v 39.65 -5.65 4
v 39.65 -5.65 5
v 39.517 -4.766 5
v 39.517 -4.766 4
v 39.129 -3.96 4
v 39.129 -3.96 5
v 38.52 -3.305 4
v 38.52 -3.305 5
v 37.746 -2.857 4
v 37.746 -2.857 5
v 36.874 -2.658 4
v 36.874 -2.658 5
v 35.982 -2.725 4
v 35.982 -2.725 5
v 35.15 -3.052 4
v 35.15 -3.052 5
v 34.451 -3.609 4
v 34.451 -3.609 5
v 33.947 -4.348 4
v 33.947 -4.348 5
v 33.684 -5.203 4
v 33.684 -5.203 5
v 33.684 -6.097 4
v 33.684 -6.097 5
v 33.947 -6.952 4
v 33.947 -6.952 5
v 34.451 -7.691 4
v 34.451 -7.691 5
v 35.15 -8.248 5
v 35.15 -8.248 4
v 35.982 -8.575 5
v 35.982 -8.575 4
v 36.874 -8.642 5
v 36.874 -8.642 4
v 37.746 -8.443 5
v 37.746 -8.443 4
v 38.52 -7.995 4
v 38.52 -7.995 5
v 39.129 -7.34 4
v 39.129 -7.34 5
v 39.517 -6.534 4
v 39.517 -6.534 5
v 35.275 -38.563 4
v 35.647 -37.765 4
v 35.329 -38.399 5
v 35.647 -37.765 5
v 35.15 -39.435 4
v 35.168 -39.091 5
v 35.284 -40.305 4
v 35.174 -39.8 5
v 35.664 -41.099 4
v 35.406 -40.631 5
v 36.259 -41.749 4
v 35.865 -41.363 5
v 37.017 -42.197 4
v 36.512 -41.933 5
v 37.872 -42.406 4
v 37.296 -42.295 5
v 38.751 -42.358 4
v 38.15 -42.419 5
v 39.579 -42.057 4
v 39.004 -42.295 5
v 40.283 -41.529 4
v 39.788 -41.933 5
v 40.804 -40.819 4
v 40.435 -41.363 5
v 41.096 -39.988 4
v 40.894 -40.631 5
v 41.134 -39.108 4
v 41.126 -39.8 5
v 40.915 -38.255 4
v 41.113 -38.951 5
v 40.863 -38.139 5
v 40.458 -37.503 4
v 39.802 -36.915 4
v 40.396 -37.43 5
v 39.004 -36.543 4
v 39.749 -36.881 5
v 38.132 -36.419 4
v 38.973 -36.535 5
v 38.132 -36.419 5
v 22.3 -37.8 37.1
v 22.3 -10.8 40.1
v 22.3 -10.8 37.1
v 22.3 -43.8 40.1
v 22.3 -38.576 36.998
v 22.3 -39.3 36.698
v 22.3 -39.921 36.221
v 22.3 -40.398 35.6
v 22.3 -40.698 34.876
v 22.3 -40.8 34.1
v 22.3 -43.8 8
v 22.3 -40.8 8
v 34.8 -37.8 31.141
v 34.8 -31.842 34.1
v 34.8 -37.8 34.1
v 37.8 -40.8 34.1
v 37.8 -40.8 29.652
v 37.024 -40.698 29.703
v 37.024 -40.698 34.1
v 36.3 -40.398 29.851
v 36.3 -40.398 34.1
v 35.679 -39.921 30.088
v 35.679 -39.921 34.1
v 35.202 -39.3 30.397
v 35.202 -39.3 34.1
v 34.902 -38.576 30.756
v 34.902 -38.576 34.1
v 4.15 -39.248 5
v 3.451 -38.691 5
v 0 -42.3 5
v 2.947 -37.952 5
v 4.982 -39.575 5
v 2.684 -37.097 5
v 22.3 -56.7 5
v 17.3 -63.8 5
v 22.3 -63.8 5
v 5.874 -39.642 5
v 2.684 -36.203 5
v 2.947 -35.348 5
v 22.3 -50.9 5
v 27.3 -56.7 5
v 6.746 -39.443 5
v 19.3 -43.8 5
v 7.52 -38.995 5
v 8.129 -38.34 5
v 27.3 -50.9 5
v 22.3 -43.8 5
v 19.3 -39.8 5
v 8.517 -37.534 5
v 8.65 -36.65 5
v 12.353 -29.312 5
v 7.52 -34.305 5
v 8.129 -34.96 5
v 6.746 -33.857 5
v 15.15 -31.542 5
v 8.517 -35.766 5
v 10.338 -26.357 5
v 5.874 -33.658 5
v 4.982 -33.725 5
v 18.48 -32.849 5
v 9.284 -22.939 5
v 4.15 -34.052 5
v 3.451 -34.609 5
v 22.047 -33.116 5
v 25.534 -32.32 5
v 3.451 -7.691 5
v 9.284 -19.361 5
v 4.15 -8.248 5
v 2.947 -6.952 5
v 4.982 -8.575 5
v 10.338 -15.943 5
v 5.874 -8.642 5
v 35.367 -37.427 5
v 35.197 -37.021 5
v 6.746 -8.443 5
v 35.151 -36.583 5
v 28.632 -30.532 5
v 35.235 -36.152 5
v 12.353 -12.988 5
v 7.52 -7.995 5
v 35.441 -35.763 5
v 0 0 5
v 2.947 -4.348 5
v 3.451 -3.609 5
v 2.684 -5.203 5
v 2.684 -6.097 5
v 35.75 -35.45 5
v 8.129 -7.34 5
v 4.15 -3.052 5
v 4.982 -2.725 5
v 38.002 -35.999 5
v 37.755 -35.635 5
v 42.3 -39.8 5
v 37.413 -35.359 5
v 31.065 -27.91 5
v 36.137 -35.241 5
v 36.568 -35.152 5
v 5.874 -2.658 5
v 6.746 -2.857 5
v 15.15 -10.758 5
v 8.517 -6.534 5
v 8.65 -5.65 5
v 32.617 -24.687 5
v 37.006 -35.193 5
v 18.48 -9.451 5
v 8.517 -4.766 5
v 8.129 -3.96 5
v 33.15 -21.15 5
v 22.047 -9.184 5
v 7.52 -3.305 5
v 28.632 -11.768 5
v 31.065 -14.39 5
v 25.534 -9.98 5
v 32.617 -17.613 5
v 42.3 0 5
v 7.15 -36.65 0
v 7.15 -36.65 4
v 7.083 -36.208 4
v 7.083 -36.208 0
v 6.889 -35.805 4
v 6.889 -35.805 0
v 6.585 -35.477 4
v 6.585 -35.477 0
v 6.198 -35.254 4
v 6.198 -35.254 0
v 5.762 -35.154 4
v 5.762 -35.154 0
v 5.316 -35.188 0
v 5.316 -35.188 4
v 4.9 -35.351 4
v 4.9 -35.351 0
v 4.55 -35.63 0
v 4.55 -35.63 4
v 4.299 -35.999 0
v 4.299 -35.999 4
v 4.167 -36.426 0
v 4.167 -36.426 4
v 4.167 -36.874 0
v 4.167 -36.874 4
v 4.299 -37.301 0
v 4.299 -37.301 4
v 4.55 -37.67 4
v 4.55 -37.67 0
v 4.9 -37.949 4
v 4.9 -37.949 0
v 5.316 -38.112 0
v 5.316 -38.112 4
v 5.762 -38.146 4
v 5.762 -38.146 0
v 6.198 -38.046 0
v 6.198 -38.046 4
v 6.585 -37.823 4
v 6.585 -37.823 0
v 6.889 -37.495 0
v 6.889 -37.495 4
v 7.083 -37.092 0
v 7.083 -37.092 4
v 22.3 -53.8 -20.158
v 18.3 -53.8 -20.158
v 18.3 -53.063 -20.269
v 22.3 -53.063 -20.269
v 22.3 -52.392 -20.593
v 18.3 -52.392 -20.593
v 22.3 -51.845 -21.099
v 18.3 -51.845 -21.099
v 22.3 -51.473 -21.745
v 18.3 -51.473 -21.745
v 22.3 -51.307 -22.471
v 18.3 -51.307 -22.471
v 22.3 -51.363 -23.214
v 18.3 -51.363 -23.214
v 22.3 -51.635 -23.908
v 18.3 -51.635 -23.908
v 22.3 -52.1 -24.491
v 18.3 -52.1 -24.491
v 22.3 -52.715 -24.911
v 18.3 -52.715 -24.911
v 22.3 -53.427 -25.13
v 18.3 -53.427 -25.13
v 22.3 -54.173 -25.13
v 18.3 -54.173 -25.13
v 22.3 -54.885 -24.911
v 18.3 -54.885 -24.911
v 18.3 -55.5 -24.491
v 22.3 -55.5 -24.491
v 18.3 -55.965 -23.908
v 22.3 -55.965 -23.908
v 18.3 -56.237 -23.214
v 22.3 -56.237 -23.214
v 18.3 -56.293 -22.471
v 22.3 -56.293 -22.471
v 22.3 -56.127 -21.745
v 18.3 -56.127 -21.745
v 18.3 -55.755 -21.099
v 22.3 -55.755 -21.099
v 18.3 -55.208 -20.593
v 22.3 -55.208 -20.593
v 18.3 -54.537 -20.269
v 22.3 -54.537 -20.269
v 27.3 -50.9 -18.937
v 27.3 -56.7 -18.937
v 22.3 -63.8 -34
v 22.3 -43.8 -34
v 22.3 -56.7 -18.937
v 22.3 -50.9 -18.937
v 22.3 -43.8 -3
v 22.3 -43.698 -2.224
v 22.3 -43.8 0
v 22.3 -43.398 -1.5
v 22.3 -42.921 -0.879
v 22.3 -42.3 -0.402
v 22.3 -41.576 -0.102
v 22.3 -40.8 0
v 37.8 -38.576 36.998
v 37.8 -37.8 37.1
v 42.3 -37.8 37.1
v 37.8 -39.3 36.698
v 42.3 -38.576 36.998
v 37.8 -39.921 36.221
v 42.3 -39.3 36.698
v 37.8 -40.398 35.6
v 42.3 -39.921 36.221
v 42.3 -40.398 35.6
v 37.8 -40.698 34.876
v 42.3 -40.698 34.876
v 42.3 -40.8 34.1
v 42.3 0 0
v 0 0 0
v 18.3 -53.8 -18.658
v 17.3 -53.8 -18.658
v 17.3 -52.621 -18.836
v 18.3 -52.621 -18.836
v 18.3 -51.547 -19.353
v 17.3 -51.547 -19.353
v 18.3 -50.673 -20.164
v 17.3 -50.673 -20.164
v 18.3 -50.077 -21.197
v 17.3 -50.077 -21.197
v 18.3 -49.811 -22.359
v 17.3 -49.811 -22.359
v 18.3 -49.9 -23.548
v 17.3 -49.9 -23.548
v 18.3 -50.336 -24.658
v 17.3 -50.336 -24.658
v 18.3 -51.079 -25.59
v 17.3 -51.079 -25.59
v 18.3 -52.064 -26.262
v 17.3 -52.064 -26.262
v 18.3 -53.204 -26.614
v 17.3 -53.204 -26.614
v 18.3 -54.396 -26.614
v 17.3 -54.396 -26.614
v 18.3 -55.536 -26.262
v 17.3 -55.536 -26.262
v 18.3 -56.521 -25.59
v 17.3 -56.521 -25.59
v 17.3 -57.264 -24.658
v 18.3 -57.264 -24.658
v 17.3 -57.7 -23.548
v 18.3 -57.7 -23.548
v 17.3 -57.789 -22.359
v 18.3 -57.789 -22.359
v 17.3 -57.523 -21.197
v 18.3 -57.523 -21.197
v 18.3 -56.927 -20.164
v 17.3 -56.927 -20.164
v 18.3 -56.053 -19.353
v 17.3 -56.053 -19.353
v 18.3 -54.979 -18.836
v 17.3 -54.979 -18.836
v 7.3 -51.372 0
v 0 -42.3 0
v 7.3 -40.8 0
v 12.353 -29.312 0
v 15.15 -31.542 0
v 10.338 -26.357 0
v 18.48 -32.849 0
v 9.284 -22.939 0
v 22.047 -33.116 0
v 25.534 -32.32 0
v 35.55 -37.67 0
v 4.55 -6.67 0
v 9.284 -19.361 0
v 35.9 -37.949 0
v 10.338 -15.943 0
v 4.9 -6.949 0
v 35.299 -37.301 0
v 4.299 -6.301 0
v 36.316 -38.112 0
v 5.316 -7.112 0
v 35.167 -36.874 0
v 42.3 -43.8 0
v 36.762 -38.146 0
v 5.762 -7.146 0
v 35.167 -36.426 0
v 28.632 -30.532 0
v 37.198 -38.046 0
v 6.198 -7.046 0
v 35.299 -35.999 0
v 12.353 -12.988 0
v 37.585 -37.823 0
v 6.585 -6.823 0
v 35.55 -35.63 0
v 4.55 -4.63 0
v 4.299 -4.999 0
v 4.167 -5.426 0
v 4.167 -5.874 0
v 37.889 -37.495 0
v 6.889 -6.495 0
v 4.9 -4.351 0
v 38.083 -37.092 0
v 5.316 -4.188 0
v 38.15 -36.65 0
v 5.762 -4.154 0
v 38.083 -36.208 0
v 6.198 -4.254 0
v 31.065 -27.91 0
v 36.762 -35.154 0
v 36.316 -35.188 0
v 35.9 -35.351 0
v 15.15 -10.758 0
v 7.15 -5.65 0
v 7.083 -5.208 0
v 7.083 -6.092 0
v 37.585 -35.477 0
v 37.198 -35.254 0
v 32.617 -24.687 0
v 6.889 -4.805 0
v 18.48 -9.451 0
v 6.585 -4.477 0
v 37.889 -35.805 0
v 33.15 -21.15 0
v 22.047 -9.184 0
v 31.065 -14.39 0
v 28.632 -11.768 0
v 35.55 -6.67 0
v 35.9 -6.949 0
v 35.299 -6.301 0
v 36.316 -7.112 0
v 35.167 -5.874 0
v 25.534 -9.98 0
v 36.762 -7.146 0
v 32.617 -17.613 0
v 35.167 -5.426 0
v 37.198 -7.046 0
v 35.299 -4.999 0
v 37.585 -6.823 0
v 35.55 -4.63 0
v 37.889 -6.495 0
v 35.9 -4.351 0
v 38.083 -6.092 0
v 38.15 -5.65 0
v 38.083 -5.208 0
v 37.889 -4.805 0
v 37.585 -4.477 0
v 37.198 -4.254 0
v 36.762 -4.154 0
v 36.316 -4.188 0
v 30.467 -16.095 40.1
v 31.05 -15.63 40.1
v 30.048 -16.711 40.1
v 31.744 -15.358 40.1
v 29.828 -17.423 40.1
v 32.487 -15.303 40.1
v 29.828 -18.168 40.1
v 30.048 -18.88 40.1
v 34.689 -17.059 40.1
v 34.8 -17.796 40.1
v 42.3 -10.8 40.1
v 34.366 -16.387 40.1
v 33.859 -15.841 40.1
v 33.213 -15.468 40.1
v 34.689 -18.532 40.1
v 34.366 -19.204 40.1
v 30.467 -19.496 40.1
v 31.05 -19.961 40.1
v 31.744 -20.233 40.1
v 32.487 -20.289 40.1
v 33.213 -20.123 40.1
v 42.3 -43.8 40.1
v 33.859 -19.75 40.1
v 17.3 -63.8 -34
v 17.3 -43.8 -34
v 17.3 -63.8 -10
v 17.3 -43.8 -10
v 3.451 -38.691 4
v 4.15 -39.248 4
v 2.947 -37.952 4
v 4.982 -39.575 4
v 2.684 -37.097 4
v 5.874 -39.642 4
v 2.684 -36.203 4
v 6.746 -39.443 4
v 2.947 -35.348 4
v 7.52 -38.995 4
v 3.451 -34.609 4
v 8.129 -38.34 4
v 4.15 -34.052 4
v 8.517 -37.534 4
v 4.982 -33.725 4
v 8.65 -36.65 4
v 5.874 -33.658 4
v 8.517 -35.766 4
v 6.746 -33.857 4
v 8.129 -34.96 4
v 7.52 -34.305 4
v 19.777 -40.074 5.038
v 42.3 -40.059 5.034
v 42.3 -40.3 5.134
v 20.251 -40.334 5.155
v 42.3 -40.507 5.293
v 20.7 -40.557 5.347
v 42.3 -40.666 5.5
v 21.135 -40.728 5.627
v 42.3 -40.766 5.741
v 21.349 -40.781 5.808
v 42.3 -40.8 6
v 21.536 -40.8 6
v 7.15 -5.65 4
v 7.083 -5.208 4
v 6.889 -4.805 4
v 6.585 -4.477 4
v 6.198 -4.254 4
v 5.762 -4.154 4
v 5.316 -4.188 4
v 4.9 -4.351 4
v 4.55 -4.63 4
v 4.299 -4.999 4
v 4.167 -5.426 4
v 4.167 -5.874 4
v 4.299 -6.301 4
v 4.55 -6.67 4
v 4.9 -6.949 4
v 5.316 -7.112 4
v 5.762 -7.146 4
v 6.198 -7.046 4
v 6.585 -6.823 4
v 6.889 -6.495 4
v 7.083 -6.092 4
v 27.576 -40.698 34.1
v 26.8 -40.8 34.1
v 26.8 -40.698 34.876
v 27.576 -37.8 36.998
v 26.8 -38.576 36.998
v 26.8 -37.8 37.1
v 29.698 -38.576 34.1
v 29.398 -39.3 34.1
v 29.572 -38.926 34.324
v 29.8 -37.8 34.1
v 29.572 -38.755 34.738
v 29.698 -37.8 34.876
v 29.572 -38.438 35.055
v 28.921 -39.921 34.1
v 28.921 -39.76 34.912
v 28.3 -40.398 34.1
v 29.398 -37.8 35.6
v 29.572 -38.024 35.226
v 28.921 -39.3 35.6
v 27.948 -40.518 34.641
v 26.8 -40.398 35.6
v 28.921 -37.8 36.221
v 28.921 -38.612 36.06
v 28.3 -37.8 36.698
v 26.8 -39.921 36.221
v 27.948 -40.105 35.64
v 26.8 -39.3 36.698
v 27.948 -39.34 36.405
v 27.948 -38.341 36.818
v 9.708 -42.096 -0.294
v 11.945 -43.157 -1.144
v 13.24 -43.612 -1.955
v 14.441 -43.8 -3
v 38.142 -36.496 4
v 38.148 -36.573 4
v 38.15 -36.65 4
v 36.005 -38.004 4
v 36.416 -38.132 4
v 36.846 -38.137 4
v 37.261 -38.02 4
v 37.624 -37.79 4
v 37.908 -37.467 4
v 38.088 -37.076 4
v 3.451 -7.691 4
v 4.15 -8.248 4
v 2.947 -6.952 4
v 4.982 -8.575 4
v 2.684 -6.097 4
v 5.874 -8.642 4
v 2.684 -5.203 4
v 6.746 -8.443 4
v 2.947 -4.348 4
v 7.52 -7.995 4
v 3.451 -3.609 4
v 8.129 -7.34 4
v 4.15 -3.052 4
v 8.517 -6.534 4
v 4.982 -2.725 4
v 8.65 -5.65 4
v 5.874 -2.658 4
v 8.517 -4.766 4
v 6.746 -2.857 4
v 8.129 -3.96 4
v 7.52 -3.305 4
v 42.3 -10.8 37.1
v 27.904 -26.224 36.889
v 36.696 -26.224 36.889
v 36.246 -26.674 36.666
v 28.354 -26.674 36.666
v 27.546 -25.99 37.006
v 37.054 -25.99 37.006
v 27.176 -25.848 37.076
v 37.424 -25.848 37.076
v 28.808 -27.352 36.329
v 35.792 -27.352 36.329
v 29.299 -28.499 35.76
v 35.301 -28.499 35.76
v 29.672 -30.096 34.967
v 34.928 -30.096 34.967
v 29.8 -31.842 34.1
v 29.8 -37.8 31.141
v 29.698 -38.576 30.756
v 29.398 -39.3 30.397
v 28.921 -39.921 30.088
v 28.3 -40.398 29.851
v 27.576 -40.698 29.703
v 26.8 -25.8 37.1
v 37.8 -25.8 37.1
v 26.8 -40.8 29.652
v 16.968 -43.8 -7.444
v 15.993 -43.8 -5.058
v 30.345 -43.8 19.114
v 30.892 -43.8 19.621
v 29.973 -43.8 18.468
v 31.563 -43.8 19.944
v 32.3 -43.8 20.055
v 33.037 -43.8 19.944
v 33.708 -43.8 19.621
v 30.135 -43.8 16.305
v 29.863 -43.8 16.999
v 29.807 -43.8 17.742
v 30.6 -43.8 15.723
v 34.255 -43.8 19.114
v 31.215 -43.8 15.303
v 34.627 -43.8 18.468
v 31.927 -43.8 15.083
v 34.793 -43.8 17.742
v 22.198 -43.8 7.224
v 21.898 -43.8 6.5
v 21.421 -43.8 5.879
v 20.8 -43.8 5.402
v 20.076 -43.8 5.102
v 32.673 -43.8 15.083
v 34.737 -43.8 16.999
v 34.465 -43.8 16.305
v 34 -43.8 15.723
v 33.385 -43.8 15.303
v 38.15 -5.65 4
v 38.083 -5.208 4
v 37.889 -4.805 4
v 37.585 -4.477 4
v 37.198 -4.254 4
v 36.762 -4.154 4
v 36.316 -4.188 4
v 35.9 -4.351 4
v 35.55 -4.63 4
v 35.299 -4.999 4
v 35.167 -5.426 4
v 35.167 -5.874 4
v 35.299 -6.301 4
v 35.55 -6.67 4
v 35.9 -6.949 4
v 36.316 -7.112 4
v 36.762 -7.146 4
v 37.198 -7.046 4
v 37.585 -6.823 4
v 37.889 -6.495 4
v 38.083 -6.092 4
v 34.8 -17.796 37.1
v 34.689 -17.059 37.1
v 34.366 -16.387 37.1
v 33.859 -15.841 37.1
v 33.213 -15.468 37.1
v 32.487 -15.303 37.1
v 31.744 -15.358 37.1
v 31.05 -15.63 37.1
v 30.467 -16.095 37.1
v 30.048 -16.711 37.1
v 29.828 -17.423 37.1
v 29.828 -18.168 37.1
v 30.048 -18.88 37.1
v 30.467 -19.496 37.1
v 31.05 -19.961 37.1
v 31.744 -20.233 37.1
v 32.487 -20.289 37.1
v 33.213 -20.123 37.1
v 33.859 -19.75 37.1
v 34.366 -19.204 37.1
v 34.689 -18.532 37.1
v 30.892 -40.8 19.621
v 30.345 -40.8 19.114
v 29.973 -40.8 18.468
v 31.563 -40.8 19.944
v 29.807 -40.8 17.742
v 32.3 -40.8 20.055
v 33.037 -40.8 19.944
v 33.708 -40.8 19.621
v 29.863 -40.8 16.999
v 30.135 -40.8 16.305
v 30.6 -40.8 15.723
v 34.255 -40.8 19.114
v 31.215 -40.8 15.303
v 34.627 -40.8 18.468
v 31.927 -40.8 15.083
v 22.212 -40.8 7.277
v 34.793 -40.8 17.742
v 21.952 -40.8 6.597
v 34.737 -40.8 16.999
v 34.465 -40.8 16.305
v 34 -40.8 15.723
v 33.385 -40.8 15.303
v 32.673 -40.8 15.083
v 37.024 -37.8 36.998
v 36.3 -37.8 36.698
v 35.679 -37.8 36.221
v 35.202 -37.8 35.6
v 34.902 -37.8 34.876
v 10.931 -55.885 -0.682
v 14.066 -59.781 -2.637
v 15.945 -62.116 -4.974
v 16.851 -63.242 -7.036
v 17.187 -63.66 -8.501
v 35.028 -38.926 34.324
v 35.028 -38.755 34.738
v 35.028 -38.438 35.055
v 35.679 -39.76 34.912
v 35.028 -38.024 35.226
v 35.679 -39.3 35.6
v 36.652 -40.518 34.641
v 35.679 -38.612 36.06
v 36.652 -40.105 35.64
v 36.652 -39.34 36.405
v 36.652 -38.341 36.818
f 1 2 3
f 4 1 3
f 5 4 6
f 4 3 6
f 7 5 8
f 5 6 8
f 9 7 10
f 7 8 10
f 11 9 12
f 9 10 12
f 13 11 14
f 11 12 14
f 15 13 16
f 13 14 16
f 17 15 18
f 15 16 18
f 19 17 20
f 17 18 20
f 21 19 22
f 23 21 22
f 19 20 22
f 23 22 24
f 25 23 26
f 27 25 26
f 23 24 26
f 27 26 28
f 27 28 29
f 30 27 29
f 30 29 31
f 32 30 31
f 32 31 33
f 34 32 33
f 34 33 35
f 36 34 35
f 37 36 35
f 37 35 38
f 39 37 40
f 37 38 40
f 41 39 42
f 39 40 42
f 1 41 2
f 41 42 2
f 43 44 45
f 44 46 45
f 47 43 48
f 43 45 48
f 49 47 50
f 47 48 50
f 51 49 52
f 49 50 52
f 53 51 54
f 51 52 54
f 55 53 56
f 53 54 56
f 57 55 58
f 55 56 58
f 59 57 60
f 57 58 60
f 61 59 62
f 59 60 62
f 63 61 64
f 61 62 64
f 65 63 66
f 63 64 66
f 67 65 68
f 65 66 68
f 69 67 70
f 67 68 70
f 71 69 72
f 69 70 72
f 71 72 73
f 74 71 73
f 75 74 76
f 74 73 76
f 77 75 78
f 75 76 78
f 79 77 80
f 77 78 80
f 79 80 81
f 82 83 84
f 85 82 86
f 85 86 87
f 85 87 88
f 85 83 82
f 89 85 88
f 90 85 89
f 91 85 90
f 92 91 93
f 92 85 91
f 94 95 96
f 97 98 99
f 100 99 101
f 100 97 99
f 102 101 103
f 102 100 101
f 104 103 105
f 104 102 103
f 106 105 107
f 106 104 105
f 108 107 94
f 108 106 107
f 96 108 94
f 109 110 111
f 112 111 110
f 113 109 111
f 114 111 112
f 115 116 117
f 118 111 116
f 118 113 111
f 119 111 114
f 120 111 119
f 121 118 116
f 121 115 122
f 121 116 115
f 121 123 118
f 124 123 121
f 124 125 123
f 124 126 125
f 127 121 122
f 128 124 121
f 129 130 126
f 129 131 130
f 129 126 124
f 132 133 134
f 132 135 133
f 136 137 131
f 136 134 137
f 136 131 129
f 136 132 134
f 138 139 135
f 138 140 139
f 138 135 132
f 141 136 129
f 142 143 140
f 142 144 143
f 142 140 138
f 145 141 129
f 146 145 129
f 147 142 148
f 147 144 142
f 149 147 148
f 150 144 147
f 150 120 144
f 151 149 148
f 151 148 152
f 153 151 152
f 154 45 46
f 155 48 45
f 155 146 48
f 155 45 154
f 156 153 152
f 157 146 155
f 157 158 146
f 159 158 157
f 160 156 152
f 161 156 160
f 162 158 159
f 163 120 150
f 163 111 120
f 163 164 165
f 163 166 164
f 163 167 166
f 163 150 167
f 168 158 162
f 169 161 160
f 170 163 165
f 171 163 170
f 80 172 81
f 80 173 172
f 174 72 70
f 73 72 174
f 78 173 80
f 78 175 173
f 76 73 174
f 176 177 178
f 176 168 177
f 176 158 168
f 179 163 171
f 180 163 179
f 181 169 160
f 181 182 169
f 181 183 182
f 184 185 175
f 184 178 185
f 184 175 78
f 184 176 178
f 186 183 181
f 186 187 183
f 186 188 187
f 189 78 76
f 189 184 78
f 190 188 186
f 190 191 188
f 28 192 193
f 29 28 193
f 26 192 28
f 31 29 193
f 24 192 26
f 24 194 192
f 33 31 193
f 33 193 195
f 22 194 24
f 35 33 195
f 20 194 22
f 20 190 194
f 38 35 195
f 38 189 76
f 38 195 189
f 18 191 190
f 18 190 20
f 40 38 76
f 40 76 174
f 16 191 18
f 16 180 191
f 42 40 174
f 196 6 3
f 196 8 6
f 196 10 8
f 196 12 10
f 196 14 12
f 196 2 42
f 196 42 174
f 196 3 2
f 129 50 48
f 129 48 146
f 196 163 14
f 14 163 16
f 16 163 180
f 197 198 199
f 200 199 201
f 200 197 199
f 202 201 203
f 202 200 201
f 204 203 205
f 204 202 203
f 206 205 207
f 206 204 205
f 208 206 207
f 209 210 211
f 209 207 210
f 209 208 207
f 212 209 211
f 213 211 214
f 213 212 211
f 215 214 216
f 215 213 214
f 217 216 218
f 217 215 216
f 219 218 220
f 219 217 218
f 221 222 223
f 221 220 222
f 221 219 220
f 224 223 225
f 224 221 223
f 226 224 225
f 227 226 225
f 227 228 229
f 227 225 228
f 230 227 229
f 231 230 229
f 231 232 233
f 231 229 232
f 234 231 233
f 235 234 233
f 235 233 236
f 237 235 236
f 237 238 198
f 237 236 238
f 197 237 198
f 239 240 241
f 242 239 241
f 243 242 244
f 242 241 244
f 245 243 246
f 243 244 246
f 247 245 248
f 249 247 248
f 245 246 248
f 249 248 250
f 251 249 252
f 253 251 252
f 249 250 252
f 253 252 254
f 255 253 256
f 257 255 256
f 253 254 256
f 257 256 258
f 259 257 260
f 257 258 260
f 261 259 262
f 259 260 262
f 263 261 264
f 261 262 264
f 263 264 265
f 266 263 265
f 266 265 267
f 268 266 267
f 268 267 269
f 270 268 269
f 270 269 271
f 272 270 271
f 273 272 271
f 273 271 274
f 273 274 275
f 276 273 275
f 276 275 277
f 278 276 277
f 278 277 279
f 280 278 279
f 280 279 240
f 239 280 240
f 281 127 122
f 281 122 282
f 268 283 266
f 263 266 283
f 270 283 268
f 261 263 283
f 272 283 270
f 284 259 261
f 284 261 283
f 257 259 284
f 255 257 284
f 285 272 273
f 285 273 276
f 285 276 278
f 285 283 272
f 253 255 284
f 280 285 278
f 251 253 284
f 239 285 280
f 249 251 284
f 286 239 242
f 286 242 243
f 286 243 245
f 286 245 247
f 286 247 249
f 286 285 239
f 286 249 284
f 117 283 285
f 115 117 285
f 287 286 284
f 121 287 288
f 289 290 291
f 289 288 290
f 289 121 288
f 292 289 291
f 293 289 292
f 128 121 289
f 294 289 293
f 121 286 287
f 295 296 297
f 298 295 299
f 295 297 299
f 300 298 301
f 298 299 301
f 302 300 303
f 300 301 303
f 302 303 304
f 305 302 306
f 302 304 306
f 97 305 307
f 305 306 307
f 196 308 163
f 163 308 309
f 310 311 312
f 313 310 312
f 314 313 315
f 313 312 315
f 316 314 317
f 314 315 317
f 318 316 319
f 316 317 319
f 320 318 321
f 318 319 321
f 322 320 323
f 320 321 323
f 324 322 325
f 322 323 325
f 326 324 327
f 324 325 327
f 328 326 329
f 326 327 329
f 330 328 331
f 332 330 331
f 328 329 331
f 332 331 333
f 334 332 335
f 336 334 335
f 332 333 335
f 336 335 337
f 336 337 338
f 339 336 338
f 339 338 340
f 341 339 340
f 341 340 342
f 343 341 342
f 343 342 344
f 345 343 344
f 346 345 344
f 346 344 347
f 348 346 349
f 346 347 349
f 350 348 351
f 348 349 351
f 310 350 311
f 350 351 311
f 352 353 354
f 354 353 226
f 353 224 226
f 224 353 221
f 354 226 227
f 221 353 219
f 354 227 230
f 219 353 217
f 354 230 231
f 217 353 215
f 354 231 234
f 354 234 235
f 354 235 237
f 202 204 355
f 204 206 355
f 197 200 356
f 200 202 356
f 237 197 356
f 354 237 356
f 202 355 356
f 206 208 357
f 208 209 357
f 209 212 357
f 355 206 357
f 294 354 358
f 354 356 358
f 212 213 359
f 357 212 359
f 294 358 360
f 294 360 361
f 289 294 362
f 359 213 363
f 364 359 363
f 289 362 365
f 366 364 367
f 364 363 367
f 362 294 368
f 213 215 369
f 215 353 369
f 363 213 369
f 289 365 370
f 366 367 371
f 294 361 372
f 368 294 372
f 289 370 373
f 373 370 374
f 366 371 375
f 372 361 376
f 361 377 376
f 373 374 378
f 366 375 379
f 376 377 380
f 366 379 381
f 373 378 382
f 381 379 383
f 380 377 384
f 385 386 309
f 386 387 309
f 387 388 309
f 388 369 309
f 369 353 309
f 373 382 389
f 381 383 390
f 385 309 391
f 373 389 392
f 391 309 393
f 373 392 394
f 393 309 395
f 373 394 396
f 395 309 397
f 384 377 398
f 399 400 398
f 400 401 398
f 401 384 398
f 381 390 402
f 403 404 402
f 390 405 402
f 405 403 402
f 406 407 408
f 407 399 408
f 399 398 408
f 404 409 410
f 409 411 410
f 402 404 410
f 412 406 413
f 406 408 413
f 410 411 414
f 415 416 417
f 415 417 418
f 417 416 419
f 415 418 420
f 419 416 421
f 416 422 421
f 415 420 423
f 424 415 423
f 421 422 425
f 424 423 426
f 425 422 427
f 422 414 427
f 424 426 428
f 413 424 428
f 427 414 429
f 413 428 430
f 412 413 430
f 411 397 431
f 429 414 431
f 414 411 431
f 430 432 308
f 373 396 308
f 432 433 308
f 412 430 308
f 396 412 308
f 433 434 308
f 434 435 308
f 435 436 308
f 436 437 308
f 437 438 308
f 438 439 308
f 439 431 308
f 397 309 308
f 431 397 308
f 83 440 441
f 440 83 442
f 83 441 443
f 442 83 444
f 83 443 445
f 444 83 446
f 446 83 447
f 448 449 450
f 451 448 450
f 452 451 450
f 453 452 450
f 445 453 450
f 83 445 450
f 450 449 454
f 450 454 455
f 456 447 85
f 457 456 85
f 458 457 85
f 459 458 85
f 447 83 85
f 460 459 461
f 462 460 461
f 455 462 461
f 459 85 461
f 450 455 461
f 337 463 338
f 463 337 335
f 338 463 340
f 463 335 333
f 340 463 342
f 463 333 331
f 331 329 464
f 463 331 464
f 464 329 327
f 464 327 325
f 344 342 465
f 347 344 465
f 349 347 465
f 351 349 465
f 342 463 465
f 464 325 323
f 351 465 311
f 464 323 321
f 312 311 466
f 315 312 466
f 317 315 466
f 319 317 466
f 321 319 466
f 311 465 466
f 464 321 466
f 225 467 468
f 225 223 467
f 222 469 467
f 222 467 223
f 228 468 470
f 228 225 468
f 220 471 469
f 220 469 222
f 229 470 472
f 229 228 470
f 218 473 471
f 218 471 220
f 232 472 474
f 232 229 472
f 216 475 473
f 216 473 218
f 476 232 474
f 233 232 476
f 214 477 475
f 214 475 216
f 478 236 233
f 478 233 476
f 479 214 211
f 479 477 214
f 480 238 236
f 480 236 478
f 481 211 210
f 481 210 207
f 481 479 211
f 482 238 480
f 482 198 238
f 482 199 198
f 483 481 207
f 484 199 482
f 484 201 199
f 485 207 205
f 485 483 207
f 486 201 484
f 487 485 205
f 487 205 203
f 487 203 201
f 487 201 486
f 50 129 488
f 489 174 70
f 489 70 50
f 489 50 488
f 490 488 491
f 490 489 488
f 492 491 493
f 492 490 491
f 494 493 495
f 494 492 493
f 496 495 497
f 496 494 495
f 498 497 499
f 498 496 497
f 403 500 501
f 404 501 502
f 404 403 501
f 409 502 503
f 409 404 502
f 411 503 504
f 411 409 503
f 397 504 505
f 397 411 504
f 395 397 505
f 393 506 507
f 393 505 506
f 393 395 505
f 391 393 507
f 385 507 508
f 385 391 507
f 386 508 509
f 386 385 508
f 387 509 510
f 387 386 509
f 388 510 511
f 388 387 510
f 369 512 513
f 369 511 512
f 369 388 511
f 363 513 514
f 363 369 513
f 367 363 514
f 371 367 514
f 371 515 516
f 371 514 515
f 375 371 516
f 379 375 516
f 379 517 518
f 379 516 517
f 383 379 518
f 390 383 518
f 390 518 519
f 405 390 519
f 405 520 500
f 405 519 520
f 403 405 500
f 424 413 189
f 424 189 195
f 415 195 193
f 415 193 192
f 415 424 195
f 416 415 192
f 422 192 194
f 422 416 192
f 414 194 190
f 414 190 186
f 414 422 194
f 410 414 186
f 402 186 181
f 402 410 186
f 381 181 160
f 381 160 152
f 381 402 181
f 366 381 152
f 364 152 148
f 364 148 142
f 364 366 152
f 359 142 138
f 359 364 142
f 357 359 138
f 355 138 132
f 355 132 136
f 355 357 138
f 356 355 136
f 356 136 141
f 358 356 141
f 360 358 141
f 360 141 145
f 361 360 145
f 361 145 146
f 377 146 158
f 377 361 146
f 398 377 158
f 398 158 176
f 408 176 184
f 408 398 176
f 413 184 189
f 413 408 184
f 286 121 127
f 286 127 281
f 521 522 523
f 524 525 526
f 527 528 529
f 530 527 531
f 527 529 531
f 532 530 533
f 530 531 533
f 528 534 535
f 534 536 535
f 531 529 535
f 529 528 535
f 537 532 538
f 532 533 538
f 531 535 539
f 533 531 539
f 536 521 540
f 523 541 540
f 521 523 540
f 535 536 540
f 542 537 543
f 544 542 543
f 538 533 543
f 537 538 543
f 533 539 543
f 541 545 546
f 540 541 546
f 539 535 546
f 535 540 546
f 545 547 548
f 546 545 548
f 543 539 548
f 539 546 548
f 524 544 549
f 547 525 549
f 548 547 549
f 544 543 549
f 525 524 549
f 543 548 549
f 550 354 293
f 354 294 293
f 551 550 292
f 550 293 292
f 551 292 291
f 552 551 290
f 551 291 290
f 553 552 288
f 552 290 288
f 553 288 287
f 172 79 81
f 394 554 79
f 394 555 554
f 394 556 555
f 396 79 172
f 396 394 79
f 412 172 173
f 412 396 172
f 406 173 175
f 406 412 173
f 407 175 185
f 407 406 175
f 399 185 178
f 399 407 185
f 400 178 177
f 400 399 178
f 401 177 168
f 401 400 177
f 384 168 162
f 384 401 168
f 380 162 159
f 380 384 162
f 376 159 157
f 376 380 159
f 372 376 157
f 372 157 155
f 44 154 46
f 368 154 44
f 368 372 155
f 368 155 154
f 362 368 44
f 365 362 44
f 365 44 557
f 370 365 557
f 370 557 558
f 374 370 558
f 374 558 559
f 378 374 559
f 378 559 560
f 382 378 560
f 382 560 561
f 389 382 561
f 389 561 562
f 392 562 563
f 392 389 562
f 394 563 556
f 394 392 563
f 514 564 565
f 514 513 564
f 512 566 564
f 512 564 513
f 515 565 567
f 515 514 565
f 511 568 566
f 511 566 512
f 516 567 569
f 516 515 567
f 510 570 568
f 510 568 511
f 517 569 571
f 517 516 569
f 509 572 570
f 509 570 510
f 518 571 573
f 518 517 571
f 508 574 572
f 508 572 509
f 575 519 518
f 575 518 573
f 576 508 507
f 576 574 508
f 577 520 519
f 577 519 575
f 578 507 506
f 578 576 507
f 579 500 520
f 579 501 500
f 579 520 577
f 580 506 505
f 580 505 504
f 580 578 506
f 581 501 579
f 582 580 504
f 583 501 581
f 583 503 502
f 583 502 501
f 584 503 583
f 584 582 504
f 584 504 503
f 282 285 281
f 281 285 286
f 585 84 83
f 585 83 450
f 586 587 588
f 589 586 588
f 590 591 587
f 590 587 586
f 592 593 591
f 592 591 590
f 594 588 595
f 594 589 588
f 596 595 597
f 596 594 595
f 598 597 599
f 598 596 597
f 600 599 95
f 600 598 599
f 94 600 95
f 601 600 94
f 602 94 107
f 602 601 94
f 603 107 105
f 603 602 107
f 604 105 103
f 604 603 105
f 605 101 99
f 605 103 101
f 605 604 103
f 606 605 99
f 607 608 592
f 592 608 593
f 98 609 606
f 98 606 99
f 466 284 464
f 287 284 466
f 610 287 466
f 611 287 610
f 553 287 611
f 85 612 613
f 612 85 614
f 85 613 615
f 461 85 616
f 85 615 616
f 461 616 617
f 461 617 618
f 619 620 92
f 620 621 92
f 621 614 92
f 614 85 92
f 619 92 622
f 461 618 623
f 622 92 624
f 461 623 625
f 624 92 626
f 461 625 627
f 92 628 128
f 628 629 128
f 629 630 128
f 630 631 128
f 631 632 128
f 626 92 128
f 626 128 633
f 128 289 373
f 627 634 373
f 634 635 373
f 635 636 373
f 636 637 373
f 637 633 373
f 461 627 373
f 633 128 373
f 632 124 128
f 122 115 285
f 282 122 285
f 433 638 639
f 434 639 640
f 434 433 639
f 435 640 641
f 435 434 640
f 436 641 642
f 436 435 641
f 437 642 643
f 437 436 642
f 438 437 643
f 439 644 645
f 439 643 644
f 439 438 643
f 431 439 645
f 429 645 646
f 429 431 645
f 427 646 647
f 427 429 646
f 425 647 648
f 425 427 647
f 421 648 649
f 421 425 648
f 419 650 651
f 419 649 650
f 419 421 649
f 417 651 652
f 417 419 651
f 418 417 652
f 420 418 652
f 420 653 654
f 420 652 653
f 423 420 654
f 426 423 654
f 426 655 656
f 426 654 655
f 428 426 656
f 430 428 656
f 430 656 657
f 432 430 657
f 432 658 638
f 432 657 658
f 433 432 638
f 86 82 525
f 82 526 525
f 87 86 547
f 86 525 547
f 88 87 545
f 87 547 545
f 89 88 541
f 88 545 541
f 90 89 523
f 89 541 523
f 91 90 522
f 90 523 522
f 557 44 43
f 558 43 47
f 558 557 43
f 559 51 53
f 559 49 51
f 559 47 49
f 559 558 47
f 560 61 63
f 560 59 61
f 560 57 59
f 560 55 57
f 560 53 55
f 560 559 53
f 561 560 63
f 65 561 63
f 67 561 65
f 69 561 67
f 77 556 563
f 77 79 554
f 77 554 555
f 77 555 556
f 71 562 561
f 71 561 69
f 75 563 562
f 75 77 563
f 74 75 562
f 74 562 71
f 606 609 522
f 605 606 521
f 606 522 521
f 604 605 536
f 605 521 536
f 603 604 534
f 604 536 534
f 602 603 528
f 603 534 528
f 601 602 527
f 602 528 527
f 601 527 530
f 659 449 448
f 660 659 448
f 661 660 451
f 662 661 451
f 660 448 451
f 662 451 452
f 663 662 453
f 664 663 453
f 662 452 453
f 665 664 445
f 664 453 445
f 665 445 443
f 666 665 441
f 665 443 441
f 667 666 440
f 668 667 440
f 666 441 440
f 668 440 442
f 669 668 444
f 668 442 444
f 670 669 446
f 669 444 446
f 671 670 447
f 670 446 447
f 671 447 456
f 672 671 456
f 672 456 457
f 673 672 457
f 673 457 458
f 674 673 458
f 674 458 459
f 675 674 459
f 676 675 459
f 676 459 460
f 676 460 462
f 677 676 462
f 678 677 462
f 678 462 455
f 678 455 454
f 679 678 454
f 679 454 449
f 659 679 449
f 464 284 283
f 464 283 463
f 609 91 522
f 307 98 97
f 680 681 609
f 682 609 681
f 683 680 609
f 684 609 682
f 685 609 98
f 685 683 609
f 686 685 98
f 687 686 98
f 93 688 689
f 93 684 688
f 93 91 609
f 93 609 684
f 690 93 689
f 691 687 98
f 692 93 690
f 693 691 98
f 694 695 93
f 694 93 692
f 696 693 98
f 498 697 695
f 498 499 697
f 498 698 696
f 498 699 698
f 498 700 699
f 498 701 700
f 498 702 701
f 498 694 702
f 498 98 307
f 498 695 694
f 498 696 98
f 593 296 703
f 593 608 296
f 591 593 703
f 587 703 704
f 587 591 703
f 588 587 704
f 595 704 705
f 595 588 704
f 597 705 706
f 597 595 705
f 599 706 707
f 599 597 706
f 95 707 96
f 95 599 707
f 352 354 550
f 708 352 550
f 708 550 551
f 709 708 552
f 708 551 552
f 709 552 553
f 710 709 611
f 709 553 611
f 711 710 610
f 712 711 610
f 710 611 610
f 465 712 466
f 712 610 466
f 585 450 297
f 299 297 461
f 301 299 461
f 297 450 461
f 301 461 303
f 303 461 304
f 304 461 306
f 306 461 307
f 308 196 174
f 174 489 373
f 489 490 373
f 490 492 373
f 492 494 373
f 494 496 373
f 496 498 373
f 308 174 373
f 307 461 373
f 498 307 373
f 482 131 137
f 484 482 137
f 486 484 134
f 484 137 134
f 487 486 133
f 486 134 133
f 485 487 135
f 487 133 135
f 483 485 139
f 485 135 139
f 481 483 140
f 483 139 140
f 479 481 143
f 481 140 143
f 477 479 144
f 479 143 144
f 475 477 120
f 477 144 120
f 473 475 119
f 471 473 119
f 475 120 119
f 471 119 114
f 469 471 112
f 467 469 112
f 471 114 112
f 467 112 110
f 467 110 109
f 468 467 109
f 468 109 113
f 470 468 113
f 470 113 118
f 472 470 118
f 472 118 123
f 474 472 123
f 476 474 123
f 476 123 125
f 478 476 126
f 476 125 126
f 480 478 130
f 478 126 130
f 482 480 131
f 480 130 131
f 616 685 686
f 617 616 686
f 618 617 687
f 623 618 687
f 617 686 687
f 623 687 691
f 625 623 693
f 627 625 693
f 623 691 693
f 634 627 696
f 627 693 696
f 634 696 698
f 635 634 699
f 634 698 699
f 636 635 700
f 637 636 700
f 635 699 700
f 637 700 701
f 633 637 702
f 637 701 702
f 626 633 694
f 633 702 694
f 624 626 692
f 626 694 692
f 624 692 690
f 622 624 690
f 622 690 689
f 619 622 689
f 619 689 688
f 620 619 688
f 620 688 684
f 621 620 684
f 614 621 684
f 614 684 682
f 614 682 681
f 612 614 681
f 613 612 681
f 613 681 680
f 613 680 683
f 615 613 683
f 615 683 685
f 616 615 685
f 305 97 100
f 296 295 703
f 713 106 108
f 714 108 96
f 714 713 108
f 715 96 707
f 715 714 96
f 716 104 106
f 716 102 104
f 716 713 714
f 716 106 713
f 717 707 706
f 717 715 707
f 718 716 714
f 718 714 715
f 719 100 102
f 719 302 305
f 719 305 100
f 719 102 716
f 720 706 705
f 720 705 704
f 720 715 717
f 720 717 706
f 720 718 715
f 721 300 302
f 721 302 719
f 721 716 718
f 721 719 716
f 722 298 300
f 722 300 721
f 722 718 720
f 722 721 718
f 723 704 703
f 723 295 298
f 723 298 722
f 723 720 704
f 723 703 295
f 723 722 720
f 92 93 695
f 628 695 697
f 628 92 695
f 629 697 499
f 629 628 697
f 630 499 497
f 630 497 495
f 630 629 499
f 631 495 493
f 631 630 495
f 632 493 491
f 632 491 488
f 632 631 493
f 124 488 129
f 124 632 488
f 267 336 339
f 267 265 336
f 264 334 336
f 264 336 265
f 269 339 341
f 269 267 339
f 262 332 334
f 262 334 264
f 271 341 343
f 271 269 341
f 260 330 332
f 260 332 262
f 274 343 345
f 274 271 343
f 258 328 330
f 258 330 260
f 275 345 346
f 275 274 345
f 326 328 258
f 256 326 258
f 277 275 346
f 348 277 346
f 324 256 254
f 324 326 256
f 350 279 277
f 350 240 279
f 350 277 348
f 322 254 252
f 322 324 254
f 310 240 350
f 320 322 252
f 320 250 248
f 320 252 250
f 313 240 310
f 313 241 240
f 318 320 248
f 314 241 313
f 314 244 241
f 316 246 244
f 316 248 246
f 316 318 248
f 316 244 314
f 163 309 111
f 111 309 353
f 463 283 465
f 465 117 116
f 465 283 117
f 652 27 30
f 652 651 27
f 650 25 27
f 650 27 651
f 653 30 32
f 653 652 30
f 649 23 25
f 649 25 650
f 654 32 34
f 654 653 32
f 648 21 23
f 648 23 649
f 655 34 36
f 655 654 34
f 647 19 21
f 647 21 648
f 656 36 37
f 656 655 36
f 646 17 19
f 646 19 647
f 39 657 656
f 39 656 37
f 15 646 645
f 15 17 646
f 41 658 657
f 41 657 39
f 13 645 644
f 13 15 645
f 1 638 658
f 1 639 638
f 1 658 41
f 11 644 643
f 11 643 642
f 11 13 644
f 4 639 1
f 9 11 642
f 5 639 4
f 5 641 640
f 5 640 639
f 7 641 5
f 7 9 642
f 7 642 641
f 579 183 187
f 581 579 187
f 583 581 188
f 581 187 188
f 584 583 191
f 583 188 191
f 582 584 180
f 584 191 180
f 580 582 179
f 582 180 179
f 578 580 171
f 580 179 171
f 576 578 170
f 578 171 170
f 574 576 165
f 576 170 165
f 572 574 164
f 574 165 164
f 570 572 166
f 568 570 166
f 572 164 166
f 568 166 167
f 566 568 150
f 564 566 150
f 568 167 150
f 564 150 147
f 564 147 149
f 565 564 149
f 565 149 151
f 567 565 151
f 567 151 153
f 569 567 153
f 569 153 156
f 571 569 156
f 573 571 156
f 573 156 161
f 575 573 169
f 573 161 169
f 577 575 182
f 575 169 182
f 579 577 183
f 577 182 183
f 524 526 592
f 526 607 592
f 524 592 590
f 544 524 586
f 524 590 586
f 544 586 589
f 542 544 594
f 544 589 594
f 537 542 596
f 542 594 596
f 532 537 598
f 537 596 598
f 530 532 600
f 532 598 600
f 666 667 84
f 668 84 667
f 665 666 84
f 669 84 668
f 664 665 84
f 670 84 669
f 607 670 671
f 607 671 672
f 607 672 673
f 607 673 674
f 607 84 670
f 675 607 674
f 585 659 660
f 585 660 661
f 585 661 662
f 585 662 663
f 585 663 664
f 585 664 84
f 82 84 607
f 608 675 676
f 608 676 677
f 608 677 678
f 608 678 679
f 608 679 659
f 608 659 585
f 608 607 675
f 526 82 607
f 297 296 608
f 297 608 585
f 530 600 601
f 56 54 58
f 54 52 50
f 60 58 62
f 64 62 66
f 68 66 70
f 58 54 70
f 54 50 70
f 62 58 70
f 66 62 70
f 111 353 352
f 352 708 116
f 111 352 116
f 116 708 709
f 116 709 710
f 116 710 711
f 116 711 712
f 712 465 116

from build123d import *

# Parameters (mm, degrees)
SKETCH_1_R          = 1.5
SKETCH_1_R_2        = 12
EXTRUDE_1_DEPTH     = 5
SKETCH_2_W          = 5
SKETCH_2_H          = 20
EXTRUDE_2_DEPTH     = 34
FILLET_2_R          = 10
SKETCH_4_W          = 20
SKETCH_4_H          = 3
EXTRUDE_3_DEPTH     = 35.1
FILLET_3_R          = 1
SKETCH_5_W          = 20
SKETCH_5_H          = 3
EXTRUDE_4_DEPTH     = 30
RIB_1_REACH         = 83.986
SKETCH_8_WALL_W     = 182.719813126
SKETCH_8_WALL_H     = 5
SKETCH_9_R          = 2.5
CUT_EXTRUDE_1_DEPTH = 30
SKETCH_10_R         = 2.5
CUT_EXTRUDE_2_DEPTH = 30
SKETCH_11_R         = 2.5
CUT_EXTRUDE_3_DEPTH = 30
SKETCH_12_R         = 3
CUT_EXTRUDE_4_DEPTH = 1
SKETCH_13_R         = 4
CUT_EXTRUDE_5_DEPTH = 1
SKETCH_14_W         = 23.937452614
SKETCH_14_H         = 5.8
EXTRUDE_5_DEPTH     = 5
FILLET_4_R          = 3


with BuildPart() as part:
    # 草图1 → 凸台-拉伸1 (new body)
    # profile 1 of 2: a face of its own
    with BuildSketch(Plane.XY):
        Polygon((42.3, 0), (0, 0), (0, -42.3), (17.3, -63.8), (22.3, -63.8), (22.3, -43.8), (42.3, -43.8), (42.3, -42.3), align=None)
        with Locations((5.65, -36.65)):
            Circle(SKETCH_1_R, mode=Mode.SUBTRACT)
        with Locations((36.65, -36.65)):
            Circle(SKETCH_1_R, mode=Mode.SUBTRACT)
        with Locations((21.15, -21.15)):
            Circle(SKETCH_1_R_2, mode=Mode.SUBTRACT)
        with Locations((5.65, -5.65)):
            Circle(SKETCH_1_R, mode=Mode.SUBTRACT)
        with Locations((36.65, -5.65)):
            Circle(SKETCH_1_R, mode=Mode.SUBTRACT)
    # profile 2 of 2: a face of its own
    with BuildSketch(Plane.XY):
        Polygon((42.3, 0), (0, 0), (0, -42.3), (17.3, -63.8), (22.3, -63.8), (22.3, -43.8), (42.3, -43.8), (42.3, -42.3), align=None)
        with Locations((5.65, -36.65)):
            Circle(SKETCH_1_R, mode=Mode.SUBTRACT)
        with Locations((36.65, -36.65)):
            Circle(SKETCH_1_R, mode=Mode.SUBTRACT)
        with Locations((21.15, -21.15)):
            Circle(SKETCH_1_R_2, mode=Mode.SUBTRACT)
        with Locations((5.65, -5.65)):
            Circle(SKETCH_1_R, mode=Mode.SUBTRACT)
        with Locations((36.65, -5.65)):
            Circle(SKETCH_1_R, mode=Mode.SUBTRACT)
    extrude(amount=EXTRUDE_1_DEPTH)

    # 草图2 → 凸台-拉伸2 (add)
    with BuildSketch(Plane(origin=(0, 0, 0), x_dir=(-1, 0, 0), z_dir=(0, 0, -1))):
        with Locations((-19.8, -53.8)):
            Rectangle(SKETCH_2_W, SKETCH_2_H)
    extrude(amount=EXTRUDE_2_DEPTH)

    # 圆角2
    fillet_2_edges = [part.edges().sort_by_distance(p)[0] for p in [
        (17.3, -53.8, 0),
    ]]
    fillet(fillet_2_edges, radius=FILLET_2_R)

    # 草图4 → 凸台-拉伸3 (add)
    with BuildSketch(Plane.XY.offset(5)):
        with Locations((32.3, -42.3)):
            Rectangle(SKETCH_4_W, SKETCH_4_H)
    extrude(amount=EXTRUDE_3_DEPTH)

    # 圆角3
    fillet_3_edges = [part.edges().sort_by_distance(p)[0] for p in [
        (32.3, -40.8, 5),
    ]]
    fillet(fillet_3_edges, radius=FILLET_3_R)

    # 草图5 → 凸台-拉伸4 (add)
    with BuildSketch(Plane(origin=(0, -40.8, 0), x_dir=(1, 0, 0), z_dir=(0, 1, 0))):
        with Locations((32.3, -38.6)):
            Rectangle(SKETCH_5_W, SKETCH_5_H)
    extrude(amount=EXTRUDE_4_DEPTH)

    # 草图8 wall → 筋1 (add, up to next)
    with BuildSketch(Plane(origin=(32.3, -33.3, 33.375935793), x_dir=(0, -0.895662677282, -0.444734042461), z_dir=(0, 0.444734042461, -0.895662677282)), mode=Mode.PRIVATE) as rib_1_sk1:
        Rectangle(SKETCH_8_WALL_W, SKETCH_8_WALL_H)
    rib_1_tool1 = extrude(rib_1_sk1.sketch, amount=-RIB_1_REACH, mode=Mode.PRIVATE) - part.part
    add(rib_1_tool1.solids().sort_by_distance((32.3, -33.3, 33.375935793))[0])

    # 草图9 → 切除-拉伸1 (cut)
    with BuildSketch(Plane.XY.offset(40.1)):
        with Locations((32.3, -17.795537052)):
            Circle(SKETCH_9_R)
    extrude(amount=-CUT_EXTRUDE_1_DEPTH, mode=Mode.SUBTRACT)

    # 草图10 → 切除-拉伸2 (cut)
    with BuildSketch(Plane(origin=(0, -40.8, 0), x_dir=(1, 0, 0), z_dir=(0, 1, 0))):
        with Locations(Location((32.3, -17.555140143, 0), (0, 0, 270))):
            Circle(SKETCH_10_R)
    extrude(amount=-CUT_EXTRUDE_2_DEPTH, mode=Mode.SUBTRACT)

    # 草图11 → 切除-拉伸3 (cut)
    with BuildSketch(Plane.ZY.offset(-17.3)):
        with Locations((-22.658194914, -53.8)):
            Circle(SKETCH_11_R)
    extrude(amount=-CUT_EXTRUDE_3_DEPTH, mode=Mode.SUBTRACT)

    # 草图12 → 切除-拉伸4 (cut)
    with BuildSketch(Plane.XY.offset(5)):
        with Locations((5.65, -5.65)):
            Circle(SKETCH_12_R)
        with Locations((36.65, -5.65)):
            Circle(SKETCH_12_R)
        with Locations((5.65, -36.65)):
            Circle(SKETCH_12_R)
        with Locations((38.15, -39.419310808)):
            Circle(SKETCH_12_R)
    extrude(amount=-CUT_EXTRUDE_4_DEPTH, mode=Mode.SUBTRACT)

    # 草图13 → 切除-拉伸5 (cut)
    with BuildSketch(Plane.ZY.offset(-17.3)):
        with Locations((-22.658194914, -53.8)):
            Circle(SKETCH_13_R)
    extrude(amount=-CUT_EXTRUDE_5_DEPTH, mode=Mode.SUBTRACT)

    # 草图14 → 凸台-拉伸5 (add)
    with BuildSketch(Plane(origin=(22.3, 0, 0), x_dir=(0, 0, -1), z_dir=(1, 0, 0))):
        with Locations((6.968726307, -53.8)):
            Rectangle(SKETCH_14_W, SKETCH_14_H)
    extrude(amount=EXTRUDE_5_DEPTH)

    # 圆角4
    fillet_4_edges = [part.edges().sort_by_distance(p)[0] for p in [
        (26.05, -40.8, 37.1),
        (38.55, -40.8, 37.1),
        (34.8, -40.8, 33.375935793),
        (34.8, -33.300000001, 37.1),
        (29.8, -40.8, 33.375935793),
        (29.8, -33.300000001, 37.1),
        (22.3, -41.8, 5),
        (14.8, -43.8, 0),
    ]]
    fillet(fillet_4_edges, radius=FILLET_4_R)


solid = part.part
